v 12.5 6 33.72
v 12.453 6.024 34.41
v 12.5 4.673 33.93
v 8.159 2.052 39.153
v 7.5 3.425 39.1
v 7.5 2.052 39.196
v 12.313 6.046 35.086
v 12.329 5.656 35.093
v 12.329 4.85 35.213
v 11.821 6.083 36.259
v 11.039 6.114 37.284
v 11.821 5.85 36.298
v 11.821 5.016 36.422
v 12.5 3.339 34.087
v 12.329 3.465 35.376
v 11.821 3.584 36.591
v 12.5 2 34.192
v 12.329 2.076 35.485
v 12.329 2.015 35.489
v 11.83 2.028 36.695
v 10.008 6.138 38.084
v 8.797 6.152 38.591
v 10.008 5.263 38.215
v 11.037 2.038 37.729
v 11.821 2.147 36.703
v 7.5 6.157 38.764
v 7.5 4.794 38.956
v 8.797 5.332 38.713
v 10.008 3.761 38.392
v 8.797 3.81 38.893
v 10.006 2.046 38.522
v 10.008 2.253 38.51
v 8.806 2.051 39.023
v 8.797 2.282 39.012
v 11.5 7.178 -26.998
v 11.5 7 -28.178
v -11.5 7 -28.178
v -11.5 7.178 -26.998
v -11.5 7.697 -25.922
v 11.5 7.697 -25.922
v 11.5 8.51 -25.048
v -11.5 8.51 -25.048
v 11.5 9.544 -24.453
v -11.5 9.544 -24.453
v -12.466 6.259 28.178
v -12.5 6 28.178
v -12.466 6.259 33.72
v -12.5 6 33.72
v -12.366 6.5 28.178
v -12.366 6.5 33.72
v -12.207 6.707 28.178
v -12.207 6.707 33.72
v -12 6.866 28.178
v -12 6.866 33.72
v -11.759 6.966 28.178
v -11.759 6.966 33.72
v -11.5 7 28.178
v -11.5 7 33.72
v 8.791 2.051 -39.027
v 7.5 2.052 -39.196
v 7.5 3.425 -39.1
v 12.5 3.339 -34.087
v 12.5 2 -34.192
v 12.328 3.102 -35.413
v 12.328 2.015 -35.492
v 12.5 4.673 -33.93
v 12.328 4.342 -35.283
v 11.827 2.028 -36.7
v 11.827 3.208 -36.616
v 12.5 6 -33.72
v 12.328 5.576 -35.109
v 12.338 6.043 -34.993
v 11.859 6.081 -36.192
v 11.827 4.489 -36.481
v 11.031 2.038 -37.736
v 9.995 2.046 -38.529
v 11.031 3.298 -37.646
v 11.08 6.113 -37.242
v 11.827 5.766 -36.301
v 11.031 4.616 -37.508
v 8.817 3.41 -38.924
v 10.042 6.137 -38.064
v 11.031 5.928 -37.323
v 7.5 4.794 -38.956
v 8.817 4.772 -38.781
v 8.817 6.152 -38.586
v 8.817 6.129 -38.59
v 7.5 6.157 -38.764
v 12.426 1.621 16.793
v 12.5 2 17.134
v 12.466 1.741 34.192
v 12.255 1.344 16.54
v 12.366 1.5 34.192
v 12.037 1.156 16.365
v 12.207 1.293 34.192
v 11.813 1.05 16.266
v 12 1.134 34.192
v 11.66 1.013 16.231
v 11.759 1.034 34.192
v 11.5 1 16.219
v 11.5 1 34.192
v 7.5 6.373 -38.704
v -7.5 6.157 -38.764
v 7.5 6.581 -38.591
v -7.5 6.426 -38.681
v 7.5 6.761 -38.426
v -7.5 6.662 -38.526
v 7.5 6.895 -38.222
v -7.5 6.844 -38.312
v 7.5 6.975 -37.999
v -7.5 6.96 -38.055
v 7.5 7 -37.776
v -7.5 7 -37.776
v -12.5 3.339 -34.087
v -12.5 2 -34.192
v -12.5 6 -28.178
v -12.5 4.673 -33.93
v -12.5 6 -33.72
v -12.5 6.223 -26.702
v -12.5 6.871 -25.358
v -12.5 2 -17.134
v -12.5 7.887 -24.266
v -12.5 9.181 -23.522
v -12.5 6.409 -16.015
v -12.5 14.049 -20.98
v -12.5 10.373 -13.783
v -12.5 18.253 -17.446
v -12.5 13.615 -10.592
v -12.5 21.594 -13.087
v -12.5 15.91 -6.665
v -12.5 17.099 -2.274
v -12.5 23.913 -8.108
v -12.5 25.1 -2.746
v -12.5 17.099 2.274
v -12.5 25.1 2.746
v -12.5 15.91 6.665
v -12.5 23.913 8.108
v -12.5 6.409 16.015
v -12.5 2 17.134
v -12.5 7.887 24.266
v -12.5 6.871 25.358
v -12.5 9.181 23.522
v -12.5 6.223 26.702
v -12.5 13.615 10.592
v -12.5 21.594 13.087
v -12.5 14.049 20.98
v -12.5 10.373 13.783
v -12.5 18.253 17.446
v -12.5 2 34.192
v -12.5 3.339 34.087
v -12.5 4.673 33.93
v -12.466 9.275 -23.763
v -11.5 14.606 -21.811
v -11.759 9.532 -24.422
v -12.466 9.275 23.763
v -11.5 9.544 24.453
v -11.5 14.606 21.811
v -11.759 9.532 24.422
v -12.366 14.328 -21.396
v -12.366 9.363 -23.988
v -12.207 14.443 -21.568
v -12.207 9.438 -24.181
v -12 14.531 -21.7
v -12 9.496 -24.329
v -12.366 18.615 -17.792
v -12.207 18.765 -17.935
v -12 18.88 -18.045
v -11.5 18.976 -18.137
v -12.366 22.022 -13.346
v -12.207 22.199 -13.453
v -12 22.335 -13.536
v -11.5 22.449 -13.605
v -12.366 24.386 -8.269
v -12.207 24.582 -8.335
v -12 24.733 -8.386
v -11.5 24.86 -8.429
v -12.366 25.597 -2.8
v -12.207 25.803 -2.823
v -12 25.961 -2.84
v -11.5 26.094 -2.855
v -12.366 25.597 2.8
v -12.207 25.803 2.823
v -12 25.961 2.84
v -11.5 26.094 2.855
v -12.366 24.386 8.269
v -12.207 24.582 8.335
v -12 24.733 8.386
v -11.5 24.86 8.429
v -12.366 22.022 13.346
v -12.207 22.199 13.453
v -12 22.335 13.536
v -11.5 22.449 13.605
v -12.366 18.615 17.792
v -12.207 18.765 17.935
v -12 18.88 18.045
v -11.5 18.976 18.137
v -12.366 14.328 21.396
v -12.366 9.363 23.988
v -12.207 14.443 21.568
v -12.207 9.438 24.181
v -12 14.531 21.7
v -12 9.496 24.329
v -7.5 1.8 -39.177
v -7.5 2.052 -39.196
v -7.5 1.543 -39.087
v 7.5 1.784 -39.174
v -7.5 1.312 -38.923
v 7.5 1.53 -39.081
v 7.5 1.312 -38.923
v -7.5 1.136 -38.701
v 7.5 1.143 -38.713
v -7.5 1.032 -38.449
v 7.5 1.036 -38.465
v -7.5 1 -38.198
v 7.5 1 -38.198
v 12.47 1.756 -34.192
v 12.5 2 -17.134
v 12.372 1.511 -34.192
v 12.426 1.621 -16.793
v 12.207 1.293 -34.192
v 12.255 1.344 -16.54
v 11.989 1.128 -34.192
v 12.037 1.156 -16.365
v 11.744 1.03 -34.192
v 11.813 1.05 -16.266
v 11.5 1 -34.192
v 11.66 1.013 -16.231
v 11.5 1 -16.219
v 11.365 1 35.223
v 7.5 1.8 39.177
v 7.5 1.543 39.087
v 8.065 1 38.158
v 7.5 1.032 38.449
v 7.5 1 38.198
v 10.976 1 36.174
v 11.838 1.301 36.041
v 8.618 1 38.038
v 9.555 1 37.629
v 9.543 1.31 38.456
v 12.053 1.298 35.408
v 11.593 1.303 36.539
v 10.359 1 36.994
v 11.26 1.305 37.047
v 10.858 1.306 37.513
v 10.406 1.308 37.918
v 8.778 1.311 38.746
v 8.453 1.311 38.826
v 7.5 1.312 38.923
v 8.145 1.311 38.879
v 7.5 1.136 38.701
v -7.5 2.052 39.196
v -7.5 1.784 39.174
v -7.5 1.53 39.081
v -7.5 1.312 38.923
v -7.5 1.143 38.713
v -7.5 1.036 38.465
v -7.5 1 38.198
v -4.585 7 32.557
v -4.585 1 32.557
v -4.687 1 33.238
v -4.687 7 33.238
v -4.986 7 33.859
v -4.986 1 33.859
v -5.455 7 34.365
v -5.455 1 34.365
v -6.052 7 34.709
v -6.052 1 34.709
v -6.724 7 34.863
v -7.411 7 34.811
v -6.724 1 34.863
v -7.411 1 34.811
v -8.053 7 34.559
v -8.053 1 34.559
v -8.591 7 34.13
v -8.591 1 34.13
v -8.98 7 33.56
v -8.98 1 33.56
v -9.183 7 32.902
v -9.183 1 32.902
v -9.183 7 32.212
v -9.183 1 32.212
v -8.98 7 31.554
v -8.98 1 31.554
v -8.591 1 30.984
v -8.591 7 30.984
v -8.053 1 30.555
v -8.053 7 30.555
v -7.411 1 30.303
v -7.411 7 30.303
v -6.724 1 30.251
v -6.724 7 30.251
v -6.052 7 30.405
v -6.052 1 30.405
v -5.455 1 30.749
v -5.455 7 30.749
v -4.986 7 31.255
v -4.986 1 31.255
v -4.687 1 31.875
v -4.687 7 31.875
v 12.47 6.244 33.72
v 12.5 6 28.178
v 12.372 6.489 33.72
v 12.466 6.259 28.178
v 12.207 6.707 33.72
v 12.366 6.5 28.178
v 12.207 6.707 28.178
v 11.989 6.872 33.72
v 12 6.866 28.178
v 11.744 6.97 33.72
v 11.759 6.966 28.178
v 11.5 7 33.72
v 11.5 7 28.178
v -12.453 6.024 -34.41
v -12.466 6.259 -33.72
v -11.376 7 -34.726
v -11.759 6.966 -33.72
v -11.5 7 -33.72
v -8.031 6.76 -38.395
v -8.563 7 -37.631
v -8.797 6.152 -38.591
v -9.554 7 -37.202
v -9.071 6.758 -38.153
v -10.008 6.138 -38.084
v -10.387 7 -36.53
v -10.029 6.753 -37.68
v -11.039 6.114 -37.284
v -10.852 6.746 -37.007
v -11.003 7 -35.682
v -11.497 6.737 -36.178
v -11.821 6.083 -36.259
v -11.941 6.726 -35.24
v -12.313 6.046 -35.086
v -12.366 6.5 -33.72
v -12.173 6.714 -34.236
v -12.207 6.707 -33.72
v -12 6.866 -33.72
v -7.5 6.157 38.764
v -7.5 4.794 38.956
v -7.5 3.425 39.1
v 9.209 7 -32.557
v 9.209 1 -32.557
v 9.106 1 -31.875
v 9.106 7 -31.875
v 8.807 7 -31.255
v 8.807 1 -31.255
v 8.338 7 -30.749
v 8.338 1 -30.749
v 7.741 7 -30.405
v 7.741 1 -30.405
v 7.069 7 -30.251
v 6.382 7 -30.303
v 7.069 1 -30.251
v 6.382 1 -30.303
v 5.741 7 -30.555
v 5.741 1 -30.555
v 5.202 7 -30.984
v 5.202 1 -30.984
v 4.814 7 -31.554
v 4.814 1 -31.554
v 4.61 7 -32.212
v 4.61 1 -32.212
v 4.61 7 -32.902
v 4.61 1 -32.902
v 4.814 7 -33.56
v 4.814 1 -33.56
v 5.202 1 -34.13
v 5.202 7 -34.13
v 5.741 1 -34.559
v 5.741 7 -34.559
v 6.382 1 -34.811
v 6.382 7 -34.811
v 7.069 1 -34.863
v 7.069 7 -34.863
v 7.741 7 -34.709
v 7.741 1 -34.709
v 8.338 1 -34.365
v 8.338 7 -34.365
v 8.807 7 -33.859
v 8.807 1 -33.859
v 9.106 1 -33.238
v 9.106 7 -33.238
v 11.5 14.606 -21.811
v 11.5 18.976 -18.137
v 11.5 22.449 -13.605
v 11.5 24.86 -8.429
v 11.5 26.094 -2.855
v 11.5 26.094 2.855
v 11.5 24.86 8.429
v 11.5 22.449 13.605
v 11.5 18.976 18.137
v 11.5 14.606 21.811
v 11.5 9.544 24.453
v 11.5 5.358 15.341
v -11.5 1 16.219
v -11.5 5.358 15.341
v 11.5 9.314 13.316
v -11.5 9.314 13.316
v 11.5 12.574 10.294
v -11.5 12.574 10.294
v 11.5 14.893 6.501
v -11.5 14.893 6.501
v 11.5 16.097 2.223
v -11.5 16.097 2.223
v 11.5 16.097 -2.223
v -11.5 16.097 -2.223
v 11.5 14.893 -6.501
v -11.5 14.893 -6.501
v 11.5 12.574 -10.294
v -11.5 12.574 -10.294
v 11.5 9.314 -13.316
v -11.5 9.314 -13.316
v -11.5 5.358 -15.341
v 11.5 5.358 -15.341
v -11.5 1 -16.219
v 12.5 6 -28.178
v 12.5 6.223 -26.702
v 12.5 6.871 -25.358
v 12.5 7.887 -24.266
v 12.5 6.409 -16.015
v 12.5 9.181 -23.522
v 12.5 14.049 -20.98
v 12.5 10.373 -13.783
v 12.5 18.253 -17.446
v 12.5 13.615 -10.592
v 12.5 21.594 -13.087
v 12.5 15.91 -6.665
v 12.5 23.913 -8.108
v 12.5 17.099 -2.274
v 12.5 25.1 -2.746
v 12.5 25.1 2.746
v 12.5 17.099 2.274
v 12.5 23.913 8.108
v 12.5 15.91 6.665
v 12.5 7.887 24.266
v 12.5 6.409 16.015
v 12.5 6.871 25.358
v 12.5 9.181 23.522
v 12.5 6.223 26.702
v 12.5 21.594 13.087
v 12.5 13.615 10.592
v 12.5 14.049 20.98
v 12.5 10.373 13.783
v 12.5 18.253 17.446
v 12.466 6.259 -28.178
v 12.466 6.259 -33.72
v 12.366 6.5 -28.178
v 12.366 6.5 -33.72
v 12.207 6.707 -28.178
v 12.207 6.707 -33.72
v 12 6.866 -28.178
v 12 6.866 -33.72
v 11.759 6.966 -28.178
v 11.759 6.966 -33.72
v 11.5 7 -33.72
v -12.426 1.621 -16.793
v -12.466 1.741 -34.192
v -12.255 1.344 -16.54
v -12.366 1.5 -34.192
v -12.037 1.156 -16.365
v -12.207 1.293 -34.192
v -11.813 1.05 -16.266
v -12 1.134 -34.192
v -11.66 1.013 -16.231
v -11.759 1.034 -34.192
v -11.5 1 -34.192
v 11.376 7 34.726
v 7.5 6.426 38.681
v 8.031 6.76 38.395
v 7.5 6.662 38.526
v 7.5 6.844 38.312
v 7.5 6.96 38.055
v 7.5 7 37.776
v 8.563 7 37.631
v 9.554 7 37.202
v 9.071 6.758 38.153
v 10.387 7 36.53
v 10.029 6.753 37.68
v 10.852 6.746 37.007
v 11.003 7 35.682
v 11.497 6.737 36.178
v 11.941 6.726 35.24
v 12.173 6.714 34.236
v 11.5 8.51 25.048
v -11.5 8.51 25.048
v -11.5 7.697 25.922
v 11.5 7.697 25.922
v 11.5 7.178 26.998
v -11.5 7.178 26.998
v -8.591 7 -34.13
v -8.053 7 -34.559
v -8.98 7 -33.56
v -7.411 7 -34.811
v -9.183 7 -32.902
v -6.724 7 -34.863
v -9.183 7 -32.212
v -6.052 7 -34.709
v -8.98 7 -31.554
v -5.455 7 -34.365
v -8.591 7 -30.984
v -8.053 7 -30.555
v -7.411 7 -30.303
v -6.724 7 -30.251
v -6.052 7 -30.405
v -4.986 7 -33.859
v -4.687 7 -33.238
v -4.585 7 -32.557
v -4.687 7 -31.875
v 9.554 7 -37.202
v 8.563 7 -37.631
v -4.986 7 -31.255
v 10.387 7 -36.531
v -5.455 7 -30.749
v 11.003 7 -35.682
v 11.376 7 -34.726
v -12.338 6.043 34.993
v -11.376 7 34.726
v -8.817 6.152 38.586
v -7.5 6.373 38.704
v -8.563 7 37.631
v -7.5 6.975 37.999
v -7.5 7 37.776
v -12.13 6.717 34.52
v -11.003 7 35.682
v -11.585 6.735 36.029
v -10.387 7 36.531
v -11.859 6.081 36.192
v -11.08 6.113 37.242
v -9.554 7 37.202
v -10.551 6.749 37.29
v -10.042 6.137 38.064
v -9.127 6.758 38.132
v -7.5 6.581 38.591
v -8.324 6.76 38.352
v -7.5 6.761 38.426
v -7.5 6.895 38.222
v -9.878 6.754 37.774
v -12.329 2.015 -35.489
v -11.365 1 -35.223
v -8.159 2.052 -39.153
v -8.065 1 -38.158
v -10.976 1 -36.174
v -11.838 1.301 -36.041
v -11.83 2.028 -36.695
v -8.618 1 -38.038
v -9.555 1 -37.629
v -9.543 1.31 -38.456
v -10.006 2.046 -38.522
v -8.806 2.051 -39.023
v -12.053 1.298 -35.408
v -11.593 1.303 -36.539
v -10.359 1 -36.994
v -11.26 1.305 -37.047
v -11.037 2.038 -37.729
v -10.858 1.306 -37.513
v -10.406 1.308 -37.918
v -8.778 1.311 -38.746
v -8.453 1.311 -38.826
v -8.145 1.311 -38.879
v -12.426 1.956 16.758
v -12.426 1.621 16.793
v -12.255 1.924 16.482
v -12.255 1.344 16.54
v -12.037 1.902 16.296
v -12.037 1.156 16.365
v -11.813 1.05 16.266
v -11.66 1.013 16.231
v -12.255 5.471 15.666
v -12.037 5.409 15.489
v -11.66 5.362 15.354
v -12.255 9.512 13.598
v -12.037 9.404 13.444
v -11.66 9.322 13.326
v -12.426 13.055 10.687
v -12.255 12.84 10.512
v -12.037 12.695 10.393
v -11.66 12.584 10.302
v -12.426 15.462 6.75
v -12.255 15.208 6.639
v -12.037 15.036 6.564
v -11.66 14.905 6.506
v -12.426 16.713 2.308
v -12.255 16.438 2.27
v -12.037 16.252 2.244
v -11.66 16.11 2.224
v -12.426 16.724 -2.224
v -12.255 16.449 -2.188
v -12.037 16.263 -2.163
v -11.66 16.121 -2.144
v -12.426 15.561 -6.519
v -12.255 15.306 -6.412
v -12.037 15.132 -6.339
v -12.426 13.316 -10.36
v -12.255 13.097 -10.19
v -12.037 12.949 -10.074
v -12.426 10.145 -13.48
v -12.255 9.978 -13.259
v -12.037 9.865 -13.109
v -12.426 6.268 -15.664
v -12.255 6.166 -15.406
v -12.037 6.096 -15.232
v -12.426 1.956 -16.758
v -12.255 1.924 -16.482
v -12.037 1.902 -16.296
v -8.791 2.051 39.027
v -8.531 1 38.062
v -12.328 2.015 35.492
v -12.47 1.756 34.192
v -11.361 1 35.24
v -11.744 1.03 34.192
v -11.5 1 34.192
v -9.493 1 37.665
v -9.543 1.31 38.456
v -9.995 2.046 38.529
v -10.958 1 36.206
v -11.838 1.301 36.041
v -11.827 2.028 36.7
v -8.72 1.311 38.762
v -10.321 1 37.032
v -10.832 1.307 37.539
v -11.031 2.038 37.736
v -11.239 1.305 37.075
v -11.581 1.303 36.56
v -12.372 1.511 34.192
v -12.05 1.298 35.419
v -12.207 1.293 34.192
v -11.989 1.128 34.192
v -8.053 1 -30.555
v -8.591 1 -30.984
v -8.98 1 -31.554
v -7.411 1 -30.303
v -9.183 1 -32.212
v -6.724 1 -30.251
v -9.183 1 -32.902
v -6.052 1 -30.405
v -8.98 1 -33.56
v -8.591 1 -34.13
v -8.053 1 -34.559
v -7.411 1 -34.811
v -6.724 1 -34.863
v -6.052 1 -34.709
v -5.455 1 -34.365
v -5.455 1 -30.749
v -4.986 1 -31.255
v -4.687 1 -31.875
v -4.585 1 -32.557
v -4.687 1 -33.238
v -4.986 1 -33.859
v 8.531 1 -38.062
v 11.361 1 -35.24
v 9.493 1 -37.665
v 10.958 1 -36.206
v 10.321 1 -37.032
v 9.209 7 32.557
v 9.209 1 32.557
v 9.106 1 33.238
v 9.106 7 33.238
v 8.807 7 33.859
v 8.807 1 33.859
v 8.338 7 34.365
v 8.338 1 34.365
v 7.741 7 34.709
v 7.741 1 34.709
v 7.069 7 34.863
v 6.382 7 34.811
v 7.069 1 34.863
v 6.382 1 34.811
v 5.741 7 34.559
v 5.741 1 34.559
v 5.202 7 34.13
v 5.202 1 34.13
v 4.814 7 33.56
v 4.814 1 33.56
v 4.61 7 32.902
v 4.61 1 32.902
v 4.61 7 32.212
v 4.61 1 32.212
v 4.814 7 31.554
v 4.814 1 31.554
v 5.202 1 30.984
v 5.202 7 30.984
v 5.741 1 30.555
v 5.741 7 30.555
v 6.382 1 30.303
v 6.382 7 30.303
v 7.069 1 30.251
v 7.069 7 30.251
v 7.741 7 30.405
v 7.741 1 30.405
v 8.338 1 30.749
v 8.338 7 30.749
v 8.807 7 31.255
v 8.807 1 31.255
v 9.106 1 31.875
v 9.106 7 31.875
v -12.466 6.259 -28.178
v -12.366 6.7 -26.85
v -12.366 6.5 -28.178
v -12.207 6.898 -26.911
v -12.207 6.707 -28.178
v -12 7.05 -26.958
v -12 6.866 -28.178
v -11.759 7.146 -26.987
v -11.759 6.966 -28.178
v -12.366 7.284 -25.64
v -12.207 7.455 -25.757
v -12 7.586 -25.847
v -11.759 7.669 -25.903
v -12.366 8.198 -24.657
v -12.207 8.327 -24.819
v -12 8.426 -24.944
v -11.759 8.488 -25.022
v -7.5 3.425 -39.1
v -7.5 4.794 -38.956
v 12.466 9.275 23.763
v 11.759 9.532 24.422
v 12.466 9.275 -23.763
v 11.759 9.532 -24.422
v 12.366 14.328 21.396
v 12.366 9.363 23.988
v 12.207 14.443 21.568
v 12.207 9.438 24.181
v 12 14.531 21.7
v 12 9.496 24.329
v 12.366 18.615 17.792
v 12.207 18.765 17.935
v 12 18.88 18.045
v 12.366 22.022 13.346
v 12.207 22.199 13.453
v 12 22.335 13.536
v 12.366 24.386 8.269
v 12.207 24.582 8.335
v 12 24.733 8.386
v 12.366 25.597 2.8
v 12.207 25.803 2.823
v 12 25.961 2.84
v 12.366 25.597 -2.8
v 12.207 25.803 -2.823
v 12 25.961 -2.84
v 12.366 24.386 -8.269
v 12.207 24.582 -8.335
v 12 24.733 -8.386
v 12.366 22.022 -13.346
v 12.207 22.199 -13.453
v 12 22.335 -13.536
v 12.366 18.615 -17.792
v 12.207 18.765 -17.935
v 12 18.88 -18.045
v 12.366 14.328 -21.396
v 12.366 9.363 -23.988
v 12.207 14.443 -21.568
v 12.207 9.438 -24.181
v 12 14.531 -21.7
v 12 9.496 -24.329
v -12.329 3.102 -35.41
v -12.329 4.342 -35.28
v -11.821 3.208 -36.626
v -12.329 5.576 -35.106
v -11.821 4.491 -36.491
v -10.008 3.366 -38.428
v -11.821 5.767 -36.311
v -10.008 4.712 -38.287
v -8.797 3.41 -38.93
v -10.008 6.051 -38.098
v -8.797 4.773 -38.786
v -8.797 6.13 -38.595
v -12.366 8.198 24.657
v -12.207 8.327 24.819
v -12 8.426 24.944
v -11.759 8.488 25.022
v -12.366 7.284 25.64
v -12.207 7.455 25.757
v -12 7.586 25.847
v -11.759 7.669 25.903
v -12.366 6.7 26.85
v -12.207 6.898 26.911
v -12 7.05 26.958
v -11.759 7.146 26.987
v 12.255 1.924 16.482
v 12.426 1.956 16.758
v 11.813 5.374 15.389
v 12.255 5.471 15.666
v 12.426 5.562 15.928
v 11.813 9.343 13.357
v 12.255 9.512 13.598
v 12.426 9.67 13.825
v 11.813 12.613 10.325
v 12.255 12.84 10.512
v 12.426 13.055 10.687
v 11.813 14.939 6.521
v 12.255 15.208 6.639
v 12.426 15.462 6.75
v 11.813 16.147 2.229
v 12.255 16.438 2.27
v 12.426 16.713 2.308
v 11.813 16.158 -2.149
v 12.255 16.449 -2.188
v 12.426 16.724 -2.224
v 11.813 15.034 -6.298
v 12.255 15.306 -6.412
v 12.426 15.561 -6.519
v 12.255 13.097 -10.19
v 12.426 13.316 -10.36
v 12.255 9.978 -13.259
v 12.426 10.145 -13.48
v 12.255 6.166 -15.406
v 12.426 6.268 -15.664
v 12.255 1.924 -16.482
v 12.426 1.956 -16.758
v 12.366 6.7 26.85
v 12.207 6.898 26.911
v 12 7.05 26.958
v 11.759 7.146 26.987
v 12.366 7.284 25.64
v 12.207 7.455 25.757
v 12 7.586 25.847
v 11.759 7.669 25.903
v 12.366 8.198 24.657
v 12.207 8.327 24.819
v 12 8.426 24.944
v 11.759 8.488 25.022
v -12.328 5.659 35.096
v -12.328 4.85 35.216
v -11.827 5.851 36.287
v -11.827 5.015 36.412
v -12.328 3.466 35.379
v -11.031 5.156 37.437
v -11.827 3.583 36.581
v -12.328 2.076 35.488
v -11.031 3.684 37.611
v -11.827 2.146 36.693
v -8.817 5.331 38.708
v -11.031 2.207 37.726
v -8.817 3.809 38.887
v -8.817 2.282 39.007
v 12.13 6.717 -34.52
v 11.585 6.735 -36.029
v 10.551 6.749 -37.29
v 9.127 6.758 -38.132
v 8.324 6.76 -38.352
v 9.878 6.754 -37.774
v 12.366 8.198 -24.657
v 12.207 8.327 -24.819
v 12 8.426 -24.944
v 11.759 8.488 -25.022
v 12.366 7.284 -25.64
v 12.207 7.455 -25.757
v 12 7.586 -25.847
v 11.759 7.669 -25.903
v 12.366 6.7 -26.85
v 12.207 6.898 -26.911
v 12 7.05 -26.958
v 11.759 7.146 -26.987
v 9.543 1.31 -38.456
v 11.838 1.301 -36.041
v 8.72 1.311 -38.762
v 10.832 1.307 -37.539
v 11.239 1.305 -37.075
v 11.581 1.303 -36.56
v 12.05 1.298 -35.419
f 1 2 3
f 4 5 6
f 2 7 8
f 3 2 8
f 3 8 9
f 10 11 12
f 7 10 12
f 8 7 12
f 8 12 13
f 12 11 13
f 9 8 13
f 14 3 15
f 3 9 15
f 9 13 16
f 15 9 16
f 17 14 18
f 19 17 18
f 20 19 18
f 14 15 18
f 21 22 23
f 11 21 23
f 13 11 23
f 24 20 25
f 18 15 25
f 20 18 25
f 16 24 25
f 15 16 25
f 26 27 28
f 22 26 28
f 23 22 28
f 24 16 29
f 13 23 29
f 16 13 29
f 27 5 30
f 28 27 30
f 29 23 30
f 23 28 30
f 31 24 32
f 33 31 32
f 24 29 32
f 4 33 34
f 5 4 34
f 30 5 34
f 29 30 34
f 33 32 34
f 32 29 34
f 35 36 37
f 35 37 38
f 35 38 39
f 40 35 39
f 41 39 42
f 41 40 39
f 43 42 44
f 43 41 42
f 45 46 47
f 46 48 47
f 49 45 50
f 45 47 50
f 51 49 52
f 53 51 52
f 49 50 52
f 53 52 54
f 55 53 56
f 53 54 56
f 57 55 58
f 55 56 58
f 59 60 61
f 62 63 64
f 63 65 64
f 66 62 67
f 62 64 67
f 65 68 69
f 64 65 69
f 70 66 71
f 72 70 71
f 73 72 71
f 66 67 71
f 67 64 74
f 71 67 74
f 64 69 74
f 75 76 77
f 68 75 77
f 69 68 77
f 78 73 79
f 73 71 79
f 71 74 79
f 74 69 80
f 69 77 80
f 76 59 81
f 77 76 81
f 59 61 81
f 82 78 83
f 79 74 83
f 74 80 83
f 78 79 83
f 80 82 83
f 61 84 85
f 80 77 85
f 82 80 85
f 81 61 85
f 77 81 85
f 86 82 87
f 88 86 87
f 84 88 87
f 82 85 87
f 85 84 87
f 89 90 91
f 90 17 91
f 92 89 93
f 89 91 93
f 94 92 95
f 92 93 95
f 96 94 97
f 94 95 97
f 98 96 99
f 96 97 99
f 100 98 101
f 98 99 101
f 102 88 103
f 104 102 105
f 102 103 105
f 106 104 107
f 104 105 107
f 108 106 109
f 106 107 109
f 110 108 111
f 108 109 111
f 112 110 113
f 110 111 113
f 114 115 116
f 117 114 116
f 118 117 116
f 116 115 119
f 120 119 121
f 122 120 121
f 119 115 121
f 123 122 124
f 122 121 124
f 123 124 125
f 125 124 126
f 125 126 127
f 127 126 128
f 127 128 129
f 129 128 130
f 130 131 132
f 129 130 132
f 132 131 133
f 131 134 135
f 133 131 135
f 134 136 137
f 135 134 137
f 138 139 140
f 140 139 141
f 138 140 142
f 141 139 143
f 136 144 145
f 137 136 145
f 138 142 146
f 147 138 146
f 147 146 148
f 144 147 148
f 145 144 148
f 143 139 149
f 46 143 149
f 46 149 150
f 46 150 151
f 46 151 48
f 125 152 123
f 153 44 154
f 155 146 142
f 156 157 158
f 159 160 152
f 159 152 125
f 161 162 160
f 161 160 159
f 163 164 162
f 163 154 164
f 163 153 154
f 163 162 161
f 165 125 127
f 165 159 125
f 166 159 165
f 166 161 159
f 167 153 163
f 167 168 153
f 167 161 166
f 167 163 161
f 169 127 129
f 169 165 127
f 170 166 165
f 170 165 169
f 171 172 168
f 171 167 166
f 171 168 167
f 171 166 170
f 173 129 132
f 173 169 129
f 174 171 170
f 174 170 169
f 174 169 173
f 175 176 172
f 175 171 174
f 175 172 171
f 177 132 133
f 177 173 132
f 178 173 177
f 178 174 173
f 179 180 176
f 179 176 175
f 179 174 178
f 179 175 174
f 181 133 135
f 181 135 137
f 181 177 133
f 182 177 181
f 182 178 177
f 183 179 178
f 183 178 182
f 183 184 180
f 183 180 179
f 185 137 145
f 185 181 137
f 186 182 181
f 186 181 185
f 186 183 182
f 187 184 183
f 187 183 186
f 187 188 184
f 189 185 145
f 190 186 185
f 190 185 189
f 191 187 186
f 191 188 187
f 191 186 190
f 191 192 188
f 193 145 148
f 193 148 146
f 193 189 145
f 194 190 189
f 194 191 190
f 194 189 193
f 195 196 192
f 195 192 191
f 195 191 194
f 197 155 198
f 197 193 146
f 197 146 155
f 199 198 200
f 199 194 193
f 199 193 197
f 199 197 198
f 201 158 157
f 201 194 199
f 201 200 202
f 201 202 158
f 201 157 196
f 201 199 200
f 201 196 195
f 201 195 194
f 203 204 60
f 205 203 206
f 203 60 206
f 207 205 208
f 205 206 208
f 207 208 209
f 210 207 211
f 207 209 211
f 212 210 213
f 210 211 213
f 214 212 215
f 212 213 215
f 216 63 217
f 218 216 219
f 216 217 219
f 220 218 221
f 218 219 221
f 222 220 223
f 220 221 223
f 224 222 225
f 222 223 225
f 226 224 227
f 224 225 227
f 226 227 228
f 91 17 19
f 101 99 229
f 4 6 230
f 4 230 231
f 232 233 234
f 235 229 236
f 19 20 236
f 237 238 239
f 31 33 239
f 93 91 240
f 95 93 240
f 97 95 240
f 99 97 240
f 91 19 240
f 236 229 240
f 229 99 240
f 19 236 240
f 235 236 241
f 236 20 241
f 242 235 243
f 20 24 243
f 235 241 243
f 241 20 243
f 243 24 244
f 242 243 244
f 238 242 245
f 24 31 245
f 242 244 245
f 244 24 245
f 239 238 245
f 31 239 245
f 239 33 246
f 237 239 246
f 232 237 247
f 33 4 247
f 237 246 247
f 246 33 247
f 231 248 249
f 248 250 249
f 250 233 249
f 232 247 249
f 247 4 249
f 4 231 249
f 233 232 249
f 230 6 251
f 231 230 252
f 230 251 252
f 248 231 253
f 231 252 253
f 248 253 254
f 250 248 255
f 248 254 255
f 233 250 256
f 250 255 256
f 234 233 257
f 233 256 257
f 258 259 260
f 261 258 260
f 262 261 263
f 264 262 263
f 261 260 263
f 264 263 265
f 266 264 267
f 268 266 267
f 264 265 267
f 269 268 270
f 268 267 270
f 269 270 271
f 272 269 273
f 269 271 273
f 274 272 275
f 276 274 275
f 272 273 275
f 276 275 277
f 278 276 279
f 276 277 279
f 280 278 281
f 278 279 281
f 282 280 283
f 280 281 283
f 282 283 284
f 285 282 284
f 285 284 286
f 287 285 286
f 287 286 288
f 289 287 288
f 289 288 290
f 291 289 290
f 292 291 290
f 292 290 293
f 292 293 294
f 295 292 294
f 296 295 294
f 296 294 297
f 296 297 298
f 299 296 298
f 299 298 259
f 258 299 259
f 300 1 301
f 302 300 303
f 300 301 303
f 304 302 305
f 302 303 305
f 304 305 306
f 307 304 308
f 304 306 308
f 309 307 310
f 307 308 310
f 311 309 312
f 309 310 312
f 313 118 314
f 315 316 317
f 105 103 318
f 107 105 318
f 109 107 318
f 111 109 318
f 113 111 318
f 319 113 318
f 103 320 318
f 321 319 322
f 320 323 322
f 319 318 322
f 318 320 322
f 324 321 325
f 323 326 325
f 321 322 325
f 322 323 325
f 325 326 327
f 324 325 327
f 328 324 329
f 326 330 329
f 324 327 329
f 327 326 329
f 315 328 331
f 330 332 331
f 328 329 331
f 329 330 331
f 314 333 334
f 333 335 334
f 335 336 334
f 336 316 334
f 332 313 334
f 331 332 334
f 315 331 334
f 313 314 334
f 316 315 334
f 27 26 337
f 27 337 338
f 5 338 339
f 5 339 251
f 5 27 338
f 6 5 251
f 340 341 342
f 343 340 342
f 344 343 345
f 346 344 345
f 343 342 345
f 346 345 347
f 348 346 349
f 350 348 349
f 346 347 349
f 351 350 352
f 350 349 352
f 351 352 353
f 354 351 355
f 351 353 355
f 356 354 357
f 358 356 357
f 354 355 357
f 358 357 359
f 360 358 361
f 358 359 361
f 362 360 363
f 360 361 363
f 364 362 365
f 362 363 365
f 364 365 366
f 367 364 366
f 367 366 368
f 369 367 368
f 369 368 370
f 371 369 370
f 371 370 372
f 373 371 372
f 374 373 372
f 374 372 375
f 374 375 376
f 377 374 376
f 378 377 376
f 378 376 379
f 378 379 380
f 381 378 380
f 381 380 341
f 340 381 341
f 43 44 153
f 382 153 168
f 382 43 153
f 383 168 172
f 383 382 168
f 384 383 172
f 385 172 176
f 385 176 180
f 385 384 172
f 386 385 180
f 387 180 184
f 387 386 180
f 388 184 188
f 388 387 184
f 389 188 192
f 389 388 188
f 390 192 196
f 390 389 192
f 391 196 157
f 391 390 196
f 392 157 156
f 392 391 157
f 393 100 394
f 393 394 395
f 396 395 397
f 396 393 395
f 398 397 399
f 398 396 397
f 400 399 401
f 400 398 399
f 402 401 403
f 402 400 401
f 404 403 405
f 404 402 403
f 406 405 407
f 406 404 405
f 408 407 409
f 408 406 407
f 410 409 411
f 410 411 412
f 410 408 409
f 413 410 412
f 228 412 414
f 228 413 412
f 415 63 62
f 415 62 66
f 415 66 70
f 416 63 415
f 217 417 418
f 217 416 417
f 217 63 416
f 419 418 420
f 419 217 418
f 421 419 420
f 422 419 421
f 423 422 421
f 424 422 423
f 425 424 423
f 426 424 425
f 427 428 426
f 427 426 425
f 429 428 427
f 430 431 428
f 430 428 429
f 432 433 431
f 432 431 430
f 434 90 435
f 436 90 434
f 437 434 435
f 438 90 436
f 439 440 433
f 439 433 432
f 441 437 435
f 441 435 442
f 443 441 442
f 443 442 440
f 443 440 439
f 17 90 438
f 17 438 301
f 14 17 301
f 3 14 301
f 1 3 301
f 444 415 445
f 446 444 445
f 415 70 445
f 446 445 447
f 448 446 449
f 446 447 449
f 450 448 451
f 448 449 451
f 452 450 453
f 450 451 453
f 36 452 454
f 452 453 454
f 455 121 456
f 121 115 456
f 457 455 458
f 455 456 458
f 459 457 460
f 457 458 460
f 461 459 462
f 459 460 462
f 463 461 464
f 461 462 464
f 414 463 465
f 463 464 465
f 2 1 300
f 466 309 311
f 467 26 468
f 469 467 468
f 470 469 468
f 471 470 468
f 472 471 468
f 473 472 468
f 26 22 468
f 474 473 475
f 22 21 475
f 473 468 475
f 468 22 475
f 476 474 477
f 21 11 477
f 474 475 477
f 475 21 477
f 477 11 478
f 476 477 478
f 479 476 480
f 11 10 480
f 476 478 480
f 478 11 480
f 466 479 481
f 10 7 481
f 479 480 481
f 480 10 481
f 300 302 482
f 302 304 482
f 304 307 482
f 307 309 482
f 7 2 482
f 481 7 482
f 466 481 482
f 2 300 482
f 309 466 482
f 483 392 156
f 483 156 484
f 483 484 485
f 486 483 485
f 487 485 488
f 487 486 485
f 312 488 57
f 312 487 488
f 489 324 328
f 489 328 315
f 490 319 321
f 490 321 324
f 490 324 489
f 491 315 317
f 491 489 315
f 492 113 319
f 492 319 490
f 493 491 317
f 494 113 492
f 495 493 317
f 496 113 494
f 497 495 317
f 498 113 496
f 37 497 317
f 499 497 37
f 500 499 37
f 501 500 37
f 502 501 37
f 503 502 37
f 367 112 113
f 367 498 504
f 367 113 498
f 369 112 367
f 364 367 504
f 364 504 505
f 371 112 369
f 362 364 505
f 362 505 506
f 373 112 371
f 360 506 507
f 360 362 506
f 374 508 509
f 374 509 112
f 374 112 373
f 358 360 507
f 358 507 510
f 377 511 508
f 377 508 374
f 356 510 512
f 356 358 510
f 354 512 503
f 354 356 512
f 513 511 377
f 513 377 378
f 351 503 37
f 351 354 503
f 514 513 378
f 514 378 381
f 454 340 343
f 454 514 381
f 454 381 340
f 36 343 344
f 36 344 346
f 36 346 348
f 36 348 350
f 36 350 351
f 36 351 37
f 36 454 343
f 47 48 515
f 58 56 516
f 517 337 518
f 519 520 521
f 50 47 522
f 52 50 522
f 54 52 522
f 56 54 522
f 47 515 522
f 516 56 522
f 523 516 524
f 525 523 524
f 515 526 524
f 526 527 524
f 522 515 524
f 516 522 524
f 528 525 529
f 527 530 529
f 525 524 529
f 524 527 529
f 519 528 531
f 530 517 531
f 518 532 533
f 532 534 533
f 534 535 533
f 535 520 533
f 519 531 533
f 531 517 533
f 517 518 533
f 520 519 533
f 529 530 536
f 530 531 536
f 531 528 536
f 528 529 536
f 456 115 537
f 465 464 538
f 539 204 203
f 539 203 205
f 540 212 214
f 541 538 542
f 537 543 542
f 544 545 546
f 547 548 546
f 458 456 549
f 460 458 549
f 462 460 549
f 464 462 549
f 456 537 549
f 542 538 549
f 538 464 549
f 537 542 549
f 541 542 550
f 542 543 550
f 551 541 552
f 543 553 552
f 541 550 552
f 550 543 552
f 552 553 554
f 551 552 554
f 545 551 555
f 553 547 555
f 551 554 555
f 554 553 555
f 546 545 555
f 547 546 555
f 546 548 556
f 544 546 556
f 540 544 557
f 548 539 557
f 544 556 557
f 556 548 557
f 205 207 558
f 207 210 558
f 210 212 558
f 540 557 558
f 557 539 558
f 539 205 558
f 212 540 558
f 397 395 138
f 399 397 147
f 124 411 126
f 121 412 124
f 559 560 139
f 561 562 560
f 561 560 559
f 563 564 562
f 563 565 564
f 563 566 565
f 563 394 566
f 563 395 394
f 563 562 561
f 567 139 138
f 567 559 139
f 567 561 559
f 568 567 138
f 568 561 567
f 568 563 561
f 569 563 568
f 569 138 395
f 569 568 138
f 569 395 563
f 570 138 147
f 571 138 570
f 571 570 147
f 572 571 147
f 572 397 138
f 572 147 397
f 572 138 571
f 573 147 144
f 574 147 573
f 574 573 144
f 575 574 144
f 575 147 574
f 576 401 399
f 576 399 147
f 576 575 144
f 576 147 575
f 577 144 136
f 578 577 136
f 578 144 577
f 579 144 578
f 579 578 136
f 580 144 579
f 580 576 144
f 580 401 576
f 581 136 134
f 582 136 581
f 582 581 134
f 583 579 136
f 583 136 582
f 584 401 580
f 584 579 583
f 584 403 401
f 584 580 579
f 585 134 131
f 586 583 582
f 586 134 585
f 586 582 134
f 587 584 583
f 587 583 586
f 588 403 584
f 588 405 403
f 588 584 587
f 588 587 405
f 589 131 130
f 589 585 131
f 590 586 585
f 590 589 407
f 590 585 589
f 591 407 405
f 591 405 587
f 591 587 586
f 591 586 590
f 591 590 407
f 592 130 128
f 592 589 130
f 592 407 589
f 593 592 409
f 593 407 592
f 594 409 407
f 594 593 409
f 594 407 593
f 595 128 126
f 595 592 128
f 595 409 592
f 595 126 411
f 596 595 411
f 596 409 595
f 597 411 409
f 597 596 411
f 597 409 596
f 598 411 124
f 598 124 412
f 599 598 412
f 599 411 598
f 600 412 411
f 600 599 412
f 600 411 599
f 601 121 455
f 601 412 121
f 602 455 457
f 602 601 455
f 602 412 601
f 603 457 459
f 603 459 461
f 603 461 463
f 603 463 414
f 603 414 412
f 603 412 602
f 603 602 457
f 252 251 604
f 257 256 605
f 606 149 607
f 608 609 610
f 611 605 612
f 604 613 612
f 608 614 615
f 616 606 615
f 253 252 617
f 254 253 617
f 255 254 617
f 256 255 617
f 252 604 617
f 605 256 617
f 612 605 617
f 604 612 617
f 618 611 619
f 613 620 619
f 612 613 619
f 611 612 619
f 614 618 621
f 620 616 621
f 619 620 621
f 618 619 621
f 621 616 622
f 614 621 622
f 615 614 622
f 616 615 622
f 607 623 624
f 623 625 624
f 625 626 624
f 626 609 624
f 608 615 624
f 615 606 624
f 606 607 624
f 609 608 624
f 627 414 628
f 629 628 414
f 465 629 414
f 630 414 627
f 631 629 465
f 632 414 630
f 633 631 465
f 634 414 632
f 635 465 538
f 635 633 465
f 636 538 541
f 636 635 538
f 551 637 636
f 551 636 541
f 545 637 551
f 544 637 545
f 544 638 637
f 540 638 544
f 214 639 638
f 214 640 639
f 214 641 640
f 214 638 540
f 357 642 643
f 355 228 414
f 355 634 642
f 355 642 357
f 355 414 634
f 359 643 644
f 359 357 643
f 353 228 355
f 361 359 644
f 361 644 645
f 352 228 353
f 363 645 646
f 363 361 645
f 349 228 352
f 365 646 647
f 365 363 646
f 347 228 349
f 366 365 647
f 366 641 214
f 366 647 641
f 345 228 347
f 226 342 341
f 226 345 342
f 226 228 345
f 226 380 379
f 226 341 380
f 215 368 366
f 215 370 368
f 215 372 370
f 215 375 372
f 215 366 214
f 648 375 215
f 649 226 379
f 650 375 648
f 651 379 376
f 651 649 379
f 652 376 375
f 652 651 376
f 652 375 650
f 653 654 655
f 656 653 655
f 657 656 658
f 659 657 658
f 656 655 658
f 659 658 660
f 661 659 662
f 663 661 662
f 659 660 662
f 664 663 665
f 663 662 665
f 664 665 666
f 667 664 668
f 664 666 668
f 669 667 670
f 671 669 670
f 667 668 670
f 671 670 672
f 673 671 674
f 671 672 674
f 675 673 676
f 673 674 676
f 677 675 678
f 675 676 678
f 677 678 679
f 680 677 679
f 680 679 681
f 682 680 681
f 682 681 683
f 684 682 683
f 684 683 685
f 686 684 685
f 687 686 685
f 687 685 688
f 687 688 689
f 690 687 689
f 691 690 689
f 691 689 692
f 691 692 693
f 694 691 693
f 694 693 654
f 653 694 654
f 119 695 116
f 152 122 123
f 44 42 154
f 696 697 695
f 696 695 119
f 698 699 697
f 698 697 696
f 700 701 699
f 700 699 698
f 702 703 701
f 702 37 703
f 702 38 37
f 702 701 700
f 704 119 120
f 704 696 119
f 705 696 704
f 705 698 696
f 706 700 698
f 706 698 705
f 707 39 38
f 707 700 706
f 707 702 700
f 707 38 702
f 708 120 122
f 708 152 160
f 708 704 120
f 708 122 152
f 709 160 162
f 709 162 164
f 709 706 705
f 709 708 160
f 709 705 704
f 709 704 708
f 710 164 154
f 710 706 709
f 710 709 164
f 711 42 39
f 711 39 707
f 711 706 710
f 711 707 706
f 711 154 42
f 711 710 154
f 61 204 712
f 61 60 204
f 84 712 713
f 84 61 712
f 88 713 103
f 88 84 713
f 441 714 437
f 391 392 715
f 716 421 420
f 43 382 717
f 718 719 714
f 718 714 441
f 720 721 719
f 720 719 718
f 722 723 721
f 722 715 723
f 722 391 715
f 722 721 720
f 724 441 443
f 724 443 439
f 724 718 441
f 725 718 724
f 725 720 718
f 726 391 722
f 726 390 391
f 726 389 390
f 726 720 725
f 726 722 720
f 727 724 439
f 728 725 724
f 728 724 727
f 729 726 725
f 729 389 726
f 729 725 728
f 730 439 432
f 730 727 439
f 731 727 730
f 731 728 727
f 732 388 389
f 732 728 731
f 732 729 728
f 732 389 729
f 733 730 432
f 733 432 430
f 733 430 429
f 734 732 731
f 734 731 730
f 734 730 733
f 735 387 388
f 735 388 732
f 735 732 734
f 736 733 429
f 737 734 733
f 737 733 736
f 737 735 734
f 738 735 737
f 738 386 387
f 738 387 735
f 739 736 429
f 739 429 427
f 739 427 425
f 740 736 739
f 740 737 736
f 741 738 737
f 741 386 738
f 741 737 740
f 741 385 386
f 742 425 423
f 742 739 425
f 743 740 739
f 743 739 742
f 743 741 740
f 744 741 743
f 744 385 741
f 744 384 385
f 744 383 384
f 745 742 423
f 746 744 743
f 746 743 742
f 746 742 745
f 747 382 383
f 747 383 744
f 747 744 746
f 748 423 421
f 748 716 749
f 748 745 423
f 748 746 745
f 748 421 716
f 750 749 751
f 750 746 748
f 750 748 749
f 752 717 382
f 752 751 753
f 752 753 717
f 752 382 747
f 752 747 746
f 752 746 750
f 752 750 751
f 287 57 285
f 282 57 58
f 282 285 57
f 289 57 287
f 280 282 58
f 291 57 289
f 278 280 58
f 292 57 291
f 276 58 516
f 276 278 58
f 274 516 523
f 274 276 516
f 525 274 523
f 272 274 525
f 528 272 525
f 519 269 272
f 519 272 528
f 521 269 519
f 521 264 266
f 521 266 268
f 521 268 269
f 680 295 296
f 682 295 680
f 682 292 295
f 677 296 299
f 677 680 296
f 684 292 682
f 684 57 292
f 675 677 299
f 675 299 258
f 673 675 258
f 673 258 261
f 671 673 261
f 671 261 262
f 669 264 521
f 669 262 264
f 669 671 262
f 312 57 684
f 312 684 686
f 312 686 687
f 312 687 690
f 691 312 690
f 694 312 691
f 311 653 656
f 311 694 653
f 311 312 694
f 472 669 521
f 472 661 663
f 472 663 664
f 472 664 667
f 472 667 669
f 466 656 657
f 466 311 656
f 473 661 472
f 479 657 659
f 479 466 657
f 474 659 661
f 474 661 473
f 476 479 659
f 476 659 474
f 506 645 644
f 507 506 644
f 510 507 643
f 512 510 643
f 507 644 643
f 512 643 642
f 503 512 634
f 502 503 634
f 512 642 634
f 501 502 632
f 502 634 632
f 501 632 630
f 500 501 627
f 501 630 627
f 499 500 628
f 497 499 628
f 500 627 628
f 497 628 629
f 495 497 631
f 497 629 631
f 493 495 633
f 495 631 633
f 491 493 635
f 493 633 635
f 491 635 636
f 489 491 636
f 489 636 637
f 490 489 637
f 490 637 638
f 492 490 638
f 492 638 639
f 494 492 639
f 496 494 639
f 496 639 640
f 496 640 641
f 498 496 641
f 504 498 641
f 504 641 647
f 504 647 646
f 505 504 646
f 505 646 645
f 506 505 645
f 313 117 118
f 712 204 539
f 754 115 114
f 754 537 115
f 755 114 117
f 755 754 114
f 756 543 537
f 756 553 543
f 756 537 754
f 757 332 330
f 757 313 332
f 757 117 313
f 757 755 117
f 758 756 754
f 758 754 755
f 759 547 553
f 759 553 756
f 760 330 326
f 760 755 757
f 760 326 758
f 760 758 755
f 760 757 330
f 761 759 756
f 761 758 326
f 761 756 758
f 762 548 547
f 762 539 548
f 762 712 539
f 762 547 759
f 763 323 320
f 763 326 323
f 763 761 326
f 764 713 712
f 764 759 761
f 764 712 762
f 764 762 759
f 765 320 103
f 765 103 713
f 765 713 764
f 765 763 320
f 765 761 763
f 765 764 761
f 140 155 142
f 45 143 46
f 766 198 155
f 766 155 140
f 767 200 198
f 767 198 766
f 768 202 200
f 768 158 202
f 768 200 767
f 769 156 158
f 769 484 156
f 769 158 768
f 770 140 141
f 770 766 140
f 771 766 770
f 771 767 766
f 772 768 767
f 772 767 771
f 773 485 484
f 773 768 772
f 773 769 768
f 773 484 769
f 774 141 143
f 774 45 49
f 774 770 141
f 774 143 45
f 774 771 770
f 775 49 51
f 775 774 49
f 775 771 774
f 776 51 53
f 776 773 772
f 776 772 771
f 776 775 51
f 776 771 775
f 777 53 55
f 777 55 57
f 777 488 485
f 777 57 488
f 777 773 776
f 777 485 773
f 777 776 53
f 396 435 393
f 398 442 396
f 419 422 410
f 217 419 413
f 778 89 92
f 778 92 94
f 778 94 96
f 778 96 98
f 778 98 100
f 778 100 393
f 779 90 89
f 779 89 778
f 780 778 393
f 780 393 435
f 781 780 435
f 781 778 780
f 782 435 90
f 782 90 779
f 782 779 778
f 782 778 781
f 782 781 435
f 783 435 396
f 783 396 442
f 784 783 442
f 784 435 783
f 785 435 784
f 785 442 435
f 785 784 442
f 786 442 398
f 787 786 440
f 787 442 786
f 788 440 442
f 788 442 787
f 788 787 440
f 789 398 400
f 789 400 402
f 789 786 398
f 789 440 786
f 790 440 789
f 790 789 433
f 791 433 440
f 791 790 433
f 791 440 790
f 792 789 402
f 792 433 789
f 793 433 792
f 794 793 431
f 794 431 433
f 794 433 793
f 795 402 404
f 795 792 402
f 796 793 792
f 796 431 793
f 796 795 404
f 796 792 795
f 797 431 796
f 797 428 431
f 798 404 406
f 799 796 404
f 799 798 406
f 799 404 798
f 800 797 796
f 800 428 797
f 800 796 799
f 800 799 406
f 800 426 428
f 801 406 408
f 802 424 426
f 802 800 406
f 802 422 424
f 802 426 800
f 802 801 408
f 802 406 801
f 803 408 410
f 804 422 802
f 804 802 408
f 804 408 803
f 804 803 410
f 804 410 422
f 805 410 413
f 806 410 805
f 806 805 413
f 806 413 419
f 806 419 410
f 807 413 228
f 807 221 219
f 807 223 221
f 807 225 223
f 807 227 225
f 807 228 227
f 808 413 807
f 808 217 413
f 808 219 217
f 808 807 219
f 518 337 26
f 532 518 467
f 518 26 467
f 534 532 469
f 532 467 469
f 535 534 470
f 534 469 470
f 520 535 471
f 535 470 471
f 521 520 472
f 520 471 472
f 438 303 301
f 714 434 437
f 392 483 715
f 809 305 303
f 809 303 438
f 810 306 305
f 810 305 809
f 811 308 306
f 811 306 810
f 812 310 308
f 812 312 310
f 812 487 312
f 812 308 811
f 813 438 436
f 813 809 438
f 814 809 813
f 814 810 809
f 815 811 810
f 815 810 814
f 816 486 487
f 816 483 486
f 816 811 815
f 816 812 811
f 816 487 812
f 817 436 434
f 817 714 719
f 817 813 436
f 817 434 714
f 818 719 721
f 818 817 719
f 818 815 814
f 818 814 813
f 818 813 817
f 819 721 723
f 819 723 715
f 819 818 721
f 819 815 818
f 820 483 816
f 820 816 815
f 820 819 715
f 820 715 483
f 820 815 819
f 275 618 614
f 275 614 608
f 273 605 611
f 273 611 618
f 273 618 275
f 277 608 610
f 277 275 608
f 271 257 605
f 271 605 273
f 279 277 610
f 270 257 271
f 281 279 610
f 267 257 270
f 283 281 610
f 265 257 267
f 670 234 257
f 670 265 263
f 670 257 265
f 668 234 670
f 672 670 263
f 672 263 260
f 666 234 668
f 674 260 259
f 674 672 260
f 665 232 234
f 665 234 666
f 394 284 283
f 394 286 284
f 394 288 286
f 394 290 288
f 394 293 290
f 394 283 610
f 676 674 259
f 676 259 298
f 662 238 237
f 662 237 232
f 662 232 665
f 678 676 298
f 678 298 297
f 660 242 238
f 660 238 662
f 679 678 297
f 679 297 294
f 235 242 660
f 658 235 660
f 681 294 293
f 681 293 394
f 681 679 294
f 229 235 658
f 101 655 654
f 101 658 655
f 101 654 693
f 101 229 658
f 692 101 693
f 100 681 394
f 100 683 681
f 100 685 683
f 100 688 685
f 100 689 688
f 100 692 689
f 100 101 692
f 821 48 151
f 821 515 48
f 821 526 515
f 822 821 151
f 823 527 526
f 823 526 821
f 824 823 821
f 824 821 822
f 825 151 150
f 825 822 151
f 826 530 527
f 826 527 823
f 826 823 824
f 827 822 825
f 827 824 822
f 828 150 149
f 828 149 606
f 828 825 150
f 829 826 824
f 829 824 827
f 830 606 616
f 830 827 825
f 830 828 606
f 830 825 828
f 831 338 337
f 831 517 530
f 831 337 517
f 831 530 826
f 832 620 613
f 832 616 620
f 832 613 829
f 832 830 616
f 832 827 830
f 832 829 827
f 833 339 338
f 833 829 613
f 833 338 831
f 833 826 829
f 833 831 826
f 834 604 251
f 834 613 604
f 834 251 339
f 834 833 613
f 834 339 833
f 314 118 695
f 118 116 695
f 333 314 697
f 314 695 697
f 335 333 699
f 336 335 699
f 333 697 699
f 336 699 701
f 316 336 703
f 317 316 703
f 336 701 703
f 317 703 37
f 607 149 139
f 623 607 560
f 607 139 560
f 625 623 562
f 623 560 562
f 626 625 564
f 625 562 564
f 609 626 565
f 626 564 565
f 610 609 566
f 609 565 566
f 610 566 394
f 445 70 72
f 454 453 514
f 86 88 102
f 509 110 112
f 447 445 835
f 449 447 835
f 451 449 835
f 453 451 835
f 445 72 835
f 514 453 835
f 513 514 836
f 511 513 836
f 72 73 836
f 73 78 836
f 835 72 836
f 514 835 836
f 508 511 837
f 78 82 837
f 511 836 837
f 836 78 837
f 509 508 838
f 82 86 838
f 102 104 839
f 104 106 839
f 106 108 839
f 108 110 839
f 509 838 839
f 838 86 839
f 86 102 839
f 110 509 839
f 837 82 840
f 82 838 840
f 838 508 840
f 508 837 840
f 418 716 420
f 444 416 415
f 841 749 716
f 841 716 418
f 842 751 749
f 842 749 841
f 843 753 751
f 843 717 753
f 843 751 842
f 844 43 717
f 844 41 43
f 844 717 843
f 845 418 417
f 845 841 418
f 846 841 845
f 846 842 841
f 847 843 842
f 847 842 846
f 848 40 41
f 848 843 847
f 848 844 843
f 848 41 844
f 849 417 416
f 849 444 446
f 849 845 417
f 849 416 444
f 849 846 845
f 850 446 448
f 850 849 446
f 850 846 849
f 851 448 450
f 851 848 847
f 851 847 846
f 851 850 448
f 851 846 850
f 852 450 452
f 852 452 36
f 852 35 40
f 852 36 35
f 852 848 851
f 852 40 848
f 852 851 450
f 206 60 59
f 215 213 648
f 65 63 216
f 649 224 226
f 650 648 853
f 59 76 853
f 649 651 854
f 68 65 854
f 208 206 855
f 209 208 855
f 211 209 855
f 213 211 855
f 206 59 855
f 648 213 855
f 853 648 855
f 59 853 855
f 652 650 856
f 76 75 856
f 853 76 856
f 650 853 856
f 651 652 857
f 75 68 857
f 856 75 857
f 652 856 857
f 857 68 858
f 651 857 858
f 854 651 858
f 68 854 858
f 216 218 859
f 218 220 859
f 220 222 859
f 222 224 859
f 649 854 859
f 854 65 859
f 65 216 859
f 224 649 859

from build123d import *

# Parameters (mm, degrees)
F1_DEPTH = 12.5
F2_R     = 2.3120560343
F3_DEPTH = 26.251
F4_R     = 5
F5_R     = 1


with BuildPart() as f1:
    # F0 (on Right) → F1 (new body, symmetric)
    with BuildSketch(Plane.YZ):
        with BuildLine():
            ThreePointArc((1, 16.2192015833), (16.25, 0), (1, -16.2192015833))
            Line((1, -16.2192015833), (1, -39.2372590786))
            ThreePointArc((1, -39.2372590786), (4.0118599408, -39.0444295619), (7, -38.6207521936))
            Line((7, -38.6207521936), (7, -28.1777318701))
            ThreePointArc((7, -28.1777318701), (7.6968075003, -25.9224938479), (9.5443367466, -24.453387006))
            ThreePointArc((9.5443367466, -24.453387006), (26.25, 0), (9.5443367466, 24.453387006))
            ThreePointArc((9.5443367466, 24.453387006), (7.6968075003, 25.9224938479), (7, 28.1777318701))
            Line((7, 28.1777318701), (7, 38.6207521936))
            ThreePointArc((7, 38.6207521936), (4.0118599408, 39.0444295619), (1, 39.2372590786))
            Line((1, 39.2372590786), (1, 16.2192015833))
        make_face()
    extrude(amount=F1_DEPTH, both=True)

    # F2 (on Front) → F3 (cut, through all)
    with BuildSketch(Plane.XZ):
        with Locations((6.896616891, 32.556977123)):
            Circle(F2_R)
        with Locations((-6.896616891, 32.556977123)):
            Circle(F2_R)
        with Locations((-6.896616891, -32.556977123)):
            Circle(F2_R)
        with Locations((6.896616891, -32.556977123)):
            Circle(F2_R)
    extrude(amount=-F3_DEPTH, mode=Mode.SUBTRACT)

    # F4
    f4_edges = [f1.edges().sort_by_distance(p)[0] for p in [
        (12.5, 4.01186, 39.04443),
        (-12.5, 4.01186, 39.04443),
        (12.5, 4.01186, -39.04443),
        (-12.5, 4.01186, -39.04443),
    ]]
    fillet(f4_edges, radius=F4_R)

    # F5
    f5_edges = [f1.edges().sort_by_distance(p)[0] for p in [
        (-12.5, 1, -25.2273),
        (-12.5, 4.01565, -34.013777),
        (-12.5, 16.25, 0),
        (-12.5, 7, -30.852387),
        (-12.5, 1, 25.2273),
        (-12.5, 7.696808, -25.922494),
        (-12.5, 4.01565, 34.013777),
        (-12.5, 26.25, 0),
        (-12.5, 7, 30.852387),
        (-12.5, 7.696808, 25.922494),
        (12.5, 1, -25.2273),
        (12.5, 4.01565, -34.013777),
        (12.5, 16.25, 0),
        (12.5, 7, -30.852387),
        (12.5, 1, 25.2273),
        (12.5, 7.696808, -25.922494),
        (12.5, 4.01565, 34.013777),
        (12.5, 26.25, 0),
        (12.5, 7, 30.852387),
        (12.5, 7.696808, 25.922494),
    ]]
    fillet(f5_edges, radius=F5_R)


solid = f1.part
